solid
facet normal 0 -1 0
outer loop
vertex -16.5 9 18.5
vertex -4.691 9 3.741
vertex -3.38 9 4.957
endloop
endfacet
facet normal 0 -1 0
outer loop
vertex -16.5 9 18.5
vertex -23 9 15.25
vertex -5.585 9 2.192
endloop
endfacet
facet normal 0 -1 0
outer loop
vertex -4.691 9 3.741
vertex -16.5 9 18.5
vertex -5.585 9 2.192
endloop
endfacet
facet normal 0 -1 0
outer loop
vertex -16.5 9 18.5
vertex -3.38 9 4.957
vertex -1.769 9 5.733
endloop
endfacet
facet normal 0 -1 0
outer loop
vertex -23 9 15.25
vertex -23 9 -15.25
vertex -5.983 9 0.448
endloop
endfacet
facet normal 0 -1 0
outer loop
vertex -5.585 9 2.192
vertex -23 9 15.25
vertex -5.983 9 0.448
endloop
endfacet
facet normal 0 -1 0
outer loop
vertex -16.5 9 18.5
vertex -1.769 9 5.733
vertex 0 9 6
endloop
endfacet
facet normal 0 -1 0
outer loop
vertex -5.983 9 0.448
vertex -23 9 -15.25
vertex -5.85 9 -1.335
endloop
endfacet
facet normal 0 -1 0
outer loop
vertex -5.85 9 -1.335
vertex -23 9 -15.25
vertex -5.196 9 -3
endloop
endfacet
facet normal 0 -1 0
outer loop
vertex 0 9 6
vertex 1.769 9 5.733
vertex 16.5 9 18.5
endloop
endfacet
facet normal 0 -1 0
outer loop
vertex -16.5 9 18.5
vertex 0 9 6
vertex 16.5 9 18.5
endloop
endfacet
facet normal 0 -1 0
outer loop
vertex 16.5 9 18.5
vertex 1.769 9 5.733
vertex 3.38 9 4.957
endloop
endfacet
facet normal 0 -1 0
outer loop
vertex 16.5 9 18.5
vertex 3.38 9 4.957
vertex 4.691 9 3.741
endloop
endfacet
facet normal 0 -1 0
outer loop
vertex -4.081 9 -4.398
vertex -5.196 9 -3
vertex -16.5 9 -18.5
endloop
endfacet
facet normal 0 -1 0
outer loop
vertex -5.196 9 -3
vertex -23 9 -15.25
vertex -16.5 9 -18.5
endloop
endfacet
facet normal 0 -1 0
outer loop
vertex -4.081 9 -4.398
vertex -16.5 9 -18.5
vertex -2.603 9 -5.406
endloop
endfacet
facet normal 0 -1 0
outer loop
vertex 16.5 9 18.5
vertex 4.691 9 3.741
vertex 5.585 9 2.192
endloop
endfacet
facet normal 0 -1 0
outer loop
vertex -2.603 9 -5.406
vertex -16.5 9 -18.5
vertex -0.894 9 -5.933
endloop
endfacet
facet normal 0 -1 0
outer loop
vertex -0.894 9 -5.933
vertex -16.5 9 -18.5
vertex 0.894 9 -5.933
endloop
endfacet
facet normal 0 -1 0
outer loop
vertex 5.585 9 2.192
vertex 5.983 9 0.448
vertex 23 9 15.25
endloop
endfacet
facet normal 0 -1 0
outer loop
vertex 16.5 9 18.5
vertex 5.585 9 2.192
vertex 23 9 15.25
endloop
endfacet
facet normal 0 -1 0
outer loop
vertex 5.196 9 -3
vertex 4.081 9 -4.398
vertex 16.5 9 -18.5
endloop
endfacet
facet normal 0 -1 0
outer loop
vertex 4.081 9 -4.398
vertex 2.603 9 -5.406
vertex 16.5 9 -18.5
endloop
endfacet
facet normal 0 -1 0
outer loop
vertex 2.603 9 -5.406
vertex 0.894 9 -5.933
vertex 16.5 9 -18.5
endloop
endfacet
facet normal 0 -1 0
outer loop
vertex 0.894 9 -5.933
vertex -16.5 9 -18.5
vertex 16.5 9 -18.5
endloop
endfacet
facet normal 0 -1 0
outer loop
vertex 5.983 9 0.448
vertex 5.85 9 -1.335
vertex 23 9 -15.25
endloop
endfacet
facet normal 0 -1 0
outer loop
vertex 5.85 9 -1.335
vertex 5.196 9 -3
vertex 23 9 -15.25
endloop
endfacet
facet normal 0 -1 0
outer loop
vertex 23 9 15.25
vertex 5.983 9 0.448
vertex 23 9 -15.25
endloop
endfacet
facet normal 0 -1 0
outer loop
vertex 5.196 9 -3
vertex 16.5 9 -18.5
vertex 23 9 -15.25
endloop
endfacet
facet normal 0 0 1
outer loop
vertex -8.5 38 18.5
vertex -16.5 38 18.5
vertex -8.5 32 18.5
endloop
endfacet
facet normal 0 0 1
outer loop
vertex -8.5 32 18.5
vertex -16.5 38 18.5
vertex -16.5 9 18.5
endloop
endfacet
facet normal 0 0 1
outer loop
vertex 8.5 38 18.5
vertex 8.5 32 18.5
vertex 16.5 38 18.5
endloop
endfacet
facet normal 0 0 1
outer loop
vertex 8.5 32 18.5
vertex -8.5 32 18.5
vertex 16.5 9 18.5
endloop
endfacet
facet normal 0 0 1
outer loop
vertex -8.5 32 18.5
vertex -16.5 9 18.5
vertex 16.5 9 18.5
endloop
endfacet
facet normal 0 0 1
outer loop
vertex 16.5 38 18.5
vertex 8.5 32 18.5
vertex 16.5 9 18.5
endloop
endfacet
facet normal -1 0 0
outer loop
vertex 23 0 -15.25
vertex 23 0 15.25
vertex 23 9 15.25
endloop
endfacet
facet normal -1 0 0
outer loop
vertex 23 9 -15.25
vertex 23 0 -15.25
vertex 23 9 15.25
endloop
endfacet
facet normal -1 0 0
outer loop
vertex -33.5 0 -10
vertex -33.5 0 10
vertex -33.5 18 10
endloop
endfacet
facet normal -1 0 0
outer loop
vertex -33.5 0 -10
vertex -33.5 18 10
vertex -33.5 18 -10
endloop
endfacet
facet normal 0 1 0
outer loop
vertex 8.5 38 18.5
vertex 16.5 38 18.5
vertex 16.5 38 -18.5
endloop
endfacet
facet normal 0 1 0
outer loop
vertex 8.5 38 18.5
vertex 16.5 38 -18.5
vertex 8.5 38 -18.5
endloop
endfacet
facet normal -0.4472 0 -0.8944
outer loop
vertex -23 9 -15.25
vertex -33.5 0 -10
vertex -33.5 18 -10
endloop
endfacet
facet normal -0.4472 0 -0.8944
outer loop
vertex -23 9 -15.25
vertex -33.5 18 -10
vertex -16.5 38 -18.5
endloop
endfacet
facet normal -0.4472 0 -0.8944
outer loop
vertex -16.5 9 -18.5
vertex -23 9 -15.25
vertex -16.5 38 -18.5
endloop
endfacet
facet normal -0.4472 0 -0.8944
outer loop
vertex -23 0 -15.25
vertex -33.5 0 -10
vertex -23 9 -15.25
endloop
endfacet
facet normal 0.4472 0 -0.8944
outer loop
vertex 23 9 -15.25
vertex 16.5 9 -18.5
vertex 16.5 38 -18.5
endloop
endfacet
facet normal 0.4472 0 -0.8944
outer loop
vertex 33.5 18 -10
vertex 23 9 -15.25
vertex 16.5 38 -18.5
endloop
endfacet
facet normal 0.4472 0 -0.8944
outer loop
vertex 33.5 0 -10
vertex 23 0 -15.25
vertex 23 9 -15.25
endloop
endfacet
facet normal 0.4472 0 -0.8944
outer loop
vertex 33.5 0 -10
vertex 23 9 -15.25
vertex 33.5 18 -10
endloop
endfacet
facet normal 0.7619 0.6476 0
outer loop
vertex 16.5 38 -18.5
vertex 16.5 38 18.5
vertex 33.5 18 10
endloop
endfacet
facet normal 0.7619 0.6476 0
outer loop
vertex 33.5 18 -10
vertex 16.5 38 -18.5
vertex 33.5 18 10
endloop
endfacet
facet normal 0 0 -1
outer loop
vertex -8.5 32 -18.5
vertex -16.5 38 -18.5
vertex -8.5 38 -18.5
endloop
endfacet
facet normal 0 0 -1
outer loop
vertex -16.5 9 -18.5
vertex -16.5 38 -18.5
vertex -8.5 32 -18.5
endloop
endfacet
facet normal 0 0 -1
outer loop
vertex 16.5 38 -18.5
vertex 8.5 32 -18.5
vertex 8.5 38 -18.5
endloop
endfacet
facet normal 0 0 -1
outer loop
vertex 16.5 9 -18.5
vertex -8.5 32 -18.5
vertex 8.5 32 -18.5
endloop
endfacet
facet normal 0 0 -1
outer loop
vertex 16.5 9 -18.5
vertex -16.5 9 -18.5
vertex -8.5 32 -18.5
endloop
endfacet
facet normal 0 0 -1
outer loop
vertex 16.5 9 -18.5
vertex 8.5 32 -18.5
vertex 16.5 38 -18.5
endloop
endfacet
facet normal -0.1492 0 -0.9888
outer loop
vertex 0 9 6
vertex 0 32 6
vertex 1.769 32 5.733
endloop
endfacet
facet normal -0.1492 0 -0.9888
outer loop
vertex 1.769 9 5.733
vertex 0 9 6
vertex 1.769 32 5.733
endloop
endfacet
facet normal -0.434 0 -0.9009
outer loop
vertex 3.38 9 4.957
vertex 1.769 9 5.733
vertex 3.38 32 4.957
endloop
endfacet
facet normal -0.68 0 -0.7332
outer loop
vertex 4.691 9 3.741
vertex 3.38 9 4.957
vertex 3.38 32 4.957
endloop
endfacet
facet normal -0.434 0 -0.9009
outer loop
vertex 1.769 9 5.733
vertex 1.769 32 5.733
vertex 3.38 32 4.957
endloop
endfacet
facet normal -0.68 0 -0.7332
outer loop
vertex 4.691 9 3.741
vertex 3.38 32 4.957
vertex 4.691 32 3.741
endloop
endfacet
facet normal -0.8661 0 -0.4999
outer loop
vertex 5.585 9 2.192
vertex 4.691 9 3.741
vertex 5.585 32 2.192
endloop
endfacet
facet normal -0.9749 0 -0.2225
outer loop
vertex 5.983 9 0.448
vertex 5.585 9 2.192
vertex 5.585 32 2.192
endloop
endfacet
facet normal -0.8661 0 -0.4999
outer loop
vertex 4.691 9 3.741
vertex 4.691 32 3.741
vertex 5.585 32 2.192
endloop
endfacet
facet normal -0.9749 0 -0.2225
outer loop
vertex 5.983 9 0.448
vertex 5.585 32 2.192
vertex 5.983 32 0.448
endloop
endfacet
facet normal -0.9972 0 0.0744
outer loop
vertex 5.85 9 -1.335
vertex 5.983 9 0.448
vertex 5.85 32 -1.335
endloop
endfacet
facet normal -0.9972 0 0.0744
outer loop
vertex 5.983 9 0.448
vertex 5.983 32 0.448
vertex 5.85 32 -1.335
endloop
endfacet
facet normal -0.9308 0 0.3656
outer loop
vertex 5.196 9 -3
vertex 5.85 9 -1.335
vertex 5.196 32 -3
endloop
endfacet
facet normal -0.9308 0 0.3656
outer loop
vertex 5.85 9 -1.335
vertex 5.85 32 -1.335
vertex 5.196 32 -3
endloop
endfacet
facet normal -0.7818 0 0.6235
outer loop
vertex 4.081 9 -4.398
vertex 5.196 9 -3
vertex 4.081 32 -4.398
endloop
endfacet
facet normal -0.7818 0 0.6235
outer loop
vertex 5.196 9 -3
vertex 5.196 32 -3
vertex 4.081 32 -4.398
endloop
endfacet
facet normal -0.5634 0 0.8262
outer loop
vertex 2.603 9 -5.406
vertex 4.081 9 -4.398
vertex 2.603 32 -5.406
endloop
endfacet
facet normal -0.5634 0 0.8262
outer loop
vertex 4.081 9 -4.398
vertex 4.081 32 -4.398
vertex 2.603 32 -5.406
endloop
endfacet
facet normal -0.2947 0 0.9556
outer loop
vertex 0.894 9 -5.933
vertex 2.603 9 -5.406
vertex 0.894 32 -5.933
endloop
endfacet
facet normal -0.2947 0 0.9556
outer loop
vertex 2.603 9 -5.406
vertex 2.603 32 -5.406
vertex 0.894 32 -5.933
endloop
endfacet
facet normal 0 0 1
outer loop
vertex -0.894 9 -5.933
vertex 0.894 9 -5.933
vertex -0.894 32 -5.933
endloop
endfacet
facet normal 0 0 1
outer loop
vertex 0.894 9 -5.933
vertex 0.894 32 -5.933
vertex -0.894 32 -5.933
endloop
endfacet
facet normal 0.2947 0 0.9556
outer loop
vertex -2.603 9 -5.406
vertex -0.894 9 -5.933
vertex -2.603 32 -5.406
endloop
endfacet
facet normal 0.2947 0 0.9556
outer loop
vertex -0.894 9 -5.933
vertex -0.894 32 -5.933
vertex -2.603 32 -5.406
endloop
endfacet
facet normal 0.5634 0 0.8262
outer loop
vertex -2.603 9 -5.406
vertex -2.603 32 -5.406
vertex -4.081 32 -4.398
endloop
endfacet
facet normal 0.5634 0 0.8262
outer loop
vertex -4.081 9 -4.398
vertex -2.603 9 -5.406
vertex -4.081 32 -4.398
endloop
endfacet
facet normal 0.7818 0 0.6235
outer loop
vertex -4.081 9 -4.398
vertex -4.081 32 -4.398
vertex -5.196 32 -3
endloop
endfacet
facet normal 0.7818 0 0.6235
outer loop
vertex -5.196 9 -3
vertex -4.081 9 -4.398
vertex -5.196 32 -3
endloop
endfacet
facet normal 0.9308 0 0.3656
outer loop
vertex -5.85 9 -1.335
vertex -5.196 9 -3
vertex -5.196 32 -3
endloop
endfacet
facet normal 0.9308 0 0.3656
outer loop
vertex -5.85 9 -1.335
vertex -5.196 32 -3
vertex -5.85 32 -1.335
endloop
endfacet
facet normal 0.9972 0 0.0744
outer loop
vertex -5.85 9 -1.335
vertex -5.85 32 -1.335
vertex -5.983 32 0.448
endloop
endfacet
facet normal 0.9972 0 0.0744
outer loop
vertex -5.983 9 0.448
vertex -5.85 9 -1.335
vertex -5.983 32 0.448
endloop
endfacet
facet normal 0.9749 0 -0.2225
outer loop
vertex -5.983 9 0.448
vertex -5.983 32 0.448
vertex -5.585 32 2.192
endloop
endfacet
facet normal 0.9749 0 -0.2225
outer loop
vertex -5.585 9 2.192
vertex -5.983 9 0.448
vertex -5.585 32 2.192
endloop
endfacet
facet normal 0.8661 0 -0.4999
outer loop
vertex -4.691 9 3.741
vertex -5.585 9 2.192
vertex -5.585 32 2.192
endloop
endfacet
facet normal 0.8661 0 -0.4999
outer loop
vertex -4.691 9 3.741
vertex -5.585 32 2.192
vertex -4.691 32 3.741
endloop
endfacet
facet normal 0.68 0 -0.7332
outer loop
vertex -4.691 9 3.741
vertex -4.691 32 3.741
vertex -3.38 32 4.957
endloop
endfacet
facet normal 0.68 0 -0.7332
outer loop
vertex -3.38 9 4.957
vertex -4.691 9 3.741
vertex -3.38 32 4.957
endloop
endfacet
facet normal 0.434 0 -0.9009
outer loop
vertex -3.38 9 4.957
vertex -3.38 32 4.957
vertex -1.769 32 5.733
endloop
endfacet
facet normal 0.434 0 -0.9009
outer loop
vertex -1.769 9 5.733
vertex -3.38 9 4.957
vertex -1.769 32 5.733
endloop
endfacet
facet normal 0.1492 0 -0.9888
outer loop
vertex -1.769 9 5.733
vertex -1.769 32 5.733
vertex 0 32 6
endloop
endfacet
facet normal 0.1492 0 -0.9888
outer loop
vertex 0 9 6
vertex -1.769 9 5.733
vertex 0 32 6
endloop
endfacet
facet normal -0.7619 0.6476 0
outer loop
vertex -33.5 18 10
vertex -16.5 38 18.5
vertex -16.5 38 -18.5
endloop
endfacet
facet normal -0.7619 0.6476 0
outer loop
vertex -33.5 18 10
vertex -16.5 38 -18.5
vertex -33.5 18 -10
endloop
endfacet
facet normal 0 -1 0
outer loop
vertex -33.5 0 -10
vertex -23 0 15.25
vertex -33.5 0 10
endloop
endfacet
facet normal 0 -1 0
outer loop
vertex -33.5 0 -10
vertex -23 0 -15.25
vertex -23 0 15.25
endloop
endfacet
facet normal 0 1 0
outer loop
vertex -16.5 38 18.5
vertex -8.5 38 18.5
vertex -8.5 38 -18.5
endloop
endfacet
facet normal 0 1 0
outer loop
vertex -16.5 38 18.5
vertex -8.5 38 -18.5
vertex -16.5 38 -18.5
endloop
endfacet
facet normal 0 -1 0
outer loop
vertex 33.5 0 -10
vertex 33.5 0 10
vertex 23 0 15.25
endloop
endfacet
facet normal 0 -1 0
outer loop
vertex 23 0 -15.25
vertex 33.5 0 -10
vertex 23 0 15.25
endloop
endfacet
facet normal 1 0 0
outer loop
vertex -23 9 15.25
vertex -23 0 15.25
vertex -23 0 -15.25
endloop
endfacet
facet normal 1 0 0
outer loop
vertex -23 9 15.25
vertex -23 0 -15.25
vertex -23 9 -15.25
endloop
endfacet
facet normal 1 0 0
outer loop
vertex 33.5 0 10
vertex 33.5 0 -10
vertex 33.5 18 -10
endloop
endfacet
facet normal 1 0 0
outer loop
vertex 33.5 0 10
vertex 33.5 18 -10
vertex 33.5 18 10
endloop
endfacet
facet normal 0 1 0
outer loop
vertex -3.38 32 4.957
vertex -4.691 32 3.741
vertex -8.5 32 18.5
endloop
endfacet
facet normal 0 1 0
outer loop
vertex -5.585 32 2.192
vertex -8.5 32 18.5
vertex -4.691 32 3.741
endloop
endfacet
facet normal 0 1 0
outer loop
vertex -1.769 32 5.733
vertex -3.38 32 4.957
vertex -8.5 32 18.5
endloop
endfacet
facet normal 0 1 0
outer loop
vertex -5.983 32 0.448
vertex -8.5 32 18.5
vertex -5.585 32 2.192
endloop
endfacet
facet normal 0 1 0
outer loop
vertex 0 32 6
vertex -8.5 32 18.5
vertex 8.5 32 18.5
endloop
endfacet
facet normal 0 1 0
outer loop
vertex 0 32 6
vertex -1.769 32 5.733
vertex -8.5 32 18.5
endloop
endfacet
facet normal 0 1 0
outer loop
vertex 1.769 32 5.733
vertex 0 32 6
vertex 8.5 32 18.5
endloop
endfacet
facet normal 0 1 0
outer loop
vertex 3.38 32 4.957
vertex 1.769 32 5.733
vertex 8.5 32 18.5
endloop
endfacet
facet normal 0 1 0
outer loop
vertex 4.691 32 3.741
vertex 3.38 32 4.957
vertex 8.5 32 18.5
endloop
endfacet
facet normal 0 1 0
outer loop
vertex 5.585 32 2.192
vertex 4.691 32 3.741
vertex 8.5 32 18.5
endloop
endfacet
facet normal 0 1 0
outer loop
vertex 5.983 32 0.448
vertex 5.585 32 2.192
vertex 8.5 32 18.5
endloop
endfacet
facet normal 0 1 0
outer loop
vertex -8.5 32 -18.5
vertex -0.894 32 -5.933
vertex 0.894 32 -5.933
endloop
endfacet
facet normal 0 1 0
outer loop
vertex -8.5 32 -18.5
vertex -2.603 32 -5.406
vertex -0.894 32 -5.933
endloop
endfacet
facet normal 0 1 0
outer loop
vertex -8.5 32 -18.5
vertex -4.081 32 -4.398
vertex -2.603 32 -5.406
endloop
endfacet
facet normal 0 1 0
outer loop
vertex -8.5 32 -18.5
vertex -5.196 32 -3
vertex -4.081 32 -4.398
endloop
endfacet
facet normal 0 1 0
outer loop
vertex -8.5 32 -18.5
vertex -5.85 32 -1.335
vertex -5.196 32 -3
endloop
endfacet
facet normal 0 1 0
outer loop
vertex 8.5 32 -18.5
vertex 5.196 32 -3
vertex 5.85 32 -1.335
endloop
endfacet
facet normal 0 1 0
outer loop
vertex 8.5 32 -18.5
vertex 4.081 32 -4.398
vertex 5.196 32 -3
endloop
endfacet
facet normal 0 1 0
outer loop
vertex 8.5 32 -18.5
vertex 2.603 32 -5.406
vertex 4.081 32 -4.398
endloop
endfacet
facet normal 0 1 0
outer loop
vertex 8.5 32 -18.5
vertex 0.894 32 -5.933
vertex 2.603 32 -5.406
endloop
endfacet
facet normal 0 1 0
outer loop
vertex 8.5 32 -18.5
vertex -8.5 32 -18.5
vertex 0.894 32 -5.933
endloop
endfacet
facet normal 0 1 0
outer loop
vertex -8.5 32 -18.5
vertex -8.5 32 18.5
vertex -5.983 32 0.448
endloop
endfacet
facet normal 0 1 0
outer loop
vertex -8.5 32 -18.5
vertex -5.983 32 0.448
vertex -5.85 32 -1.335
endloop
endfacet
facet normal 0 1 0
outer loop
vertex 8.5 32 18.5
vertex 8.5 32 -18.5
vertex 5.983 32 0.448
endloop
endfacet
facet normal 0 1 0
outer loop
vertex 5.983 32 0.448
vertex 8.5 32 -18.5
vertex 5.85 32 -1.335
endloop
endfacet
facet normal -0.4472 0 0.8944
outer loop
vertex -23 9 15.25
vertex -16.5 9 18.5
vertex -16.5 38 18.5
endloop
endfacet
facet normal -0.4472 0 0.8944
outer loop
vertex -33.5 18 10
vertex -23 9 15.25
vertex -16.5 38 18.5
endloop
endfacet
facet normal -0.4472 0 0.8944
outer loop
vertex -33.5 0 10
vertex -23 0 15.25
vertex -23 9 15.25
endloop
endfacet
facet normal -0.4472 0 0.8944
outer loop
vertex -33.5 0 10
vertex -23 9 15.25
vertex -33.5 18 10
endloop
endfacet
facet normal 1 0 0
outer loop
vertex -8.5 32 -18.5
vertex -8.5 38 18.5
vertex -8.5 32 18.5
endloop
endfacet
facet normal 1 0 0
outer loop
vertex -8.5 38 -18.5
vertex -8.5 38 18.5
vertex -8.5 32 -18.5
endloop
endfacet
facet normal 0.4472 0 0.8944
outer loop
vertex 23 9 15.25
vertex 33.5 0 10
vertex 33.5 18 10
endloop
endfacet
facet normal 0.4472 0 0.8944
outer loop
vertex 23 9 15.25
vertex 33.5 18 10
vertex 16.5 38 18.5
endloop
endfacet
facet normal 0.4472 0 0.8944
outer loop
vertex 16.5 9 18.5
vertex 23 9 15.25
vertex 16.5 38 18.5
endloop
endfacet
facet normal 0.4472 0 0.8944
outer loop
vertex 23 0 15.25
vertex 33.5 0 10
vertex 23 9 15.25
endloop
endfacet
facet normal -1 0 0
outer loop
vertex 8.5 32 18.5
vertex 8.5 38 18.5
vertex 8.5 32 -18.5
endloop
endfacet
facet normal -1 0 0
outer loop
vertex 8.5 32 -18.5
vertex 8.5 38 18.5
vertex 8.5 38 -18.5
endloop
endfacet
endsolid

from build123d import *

# Parameters (mm, degrees)
SKETCH_1_W               = 33
SKETCH_1_H               = 37
EXTRUDE_1_DEPTH          = 38
CUT_EXTRUDE_1_DEPTH      = 54.930510845
CUT_EXTRUDE_2_DEPTH      = 54.930510845
CUT_EXTRUDE_2_DEPTH_BACK = 54.930510845
SKETCH_3_W               = 46
SKETCH_3_H               = 9
SKETCH_4_W               = 17
SKETCH_4_H               = 37
CUT_EXTRUDE_3_DEPTH      = 6
SKETCH_5_R               = 6
CUT_EXTRUDE_4_DEPTH      = 50.884867445


with BuildPart() as part:
    # 草图1 → 凸台-拉伸1 (new body)
    with BuildSketch(Plane(origin=(0, 0, 0), x_dir=(1, 0, 0), z_dir=(0, 1, 0))):
        Polygon((-33.5, -10), (-33.5, 10), (-16.5, 18.5), (-16.5, -18.5), align=None)
        Rectangle(SKETCH_1_W, SKETCH_1_H)
        Polygon((33.5, -10), (16.5, -18.5), (16.5, 18.5), (33.5, 10), align=None)
    extrude(amount=EXTRUDE_1_DEPTH)

    # 草图2 → 切除-拉伸1 (cut, symmetric)
    with BuildSketch(Plane.XY):
        Polygon((-80.545432509, 152.17109707), (16.5, 38), (33.5, 18), (130.545432509, -96.17109707), (358.887626649, 97.919767949), (147.79676163, 346.261962088), align=None)
    cut_extrude_1 = extrude(amount=CUT_EXTRUDE_1_DEPTH, both=True, mode=Mode.SUBTRACT)

    # 镜向1: 切除-拉伸1 across plane
    add(cut_extrude_1.mirror(Plane(origin=(0, 0, 0), x_dir=(0, 0, 1), z_dir=(1, 0, 0))), mode=Mode.SUBTRACT)

    # 草图3 → 切除-拉伸2 (cut, two sides: drawn at the far end of the back side and taken through both)
    with BuildSketch(Plane.XY.offset(-CUT_EXTRUDE_2_DEPTH_BACK)):
        with Locations((0, 4.5)):
            Rectangle(SKETCH_3_W, SKETCH_3_H)
    extrude(amount=CUT_EXTRUDE_2_DEPTH + CUT_EXTRUDE_2_DEPTH_BACK, mode=Mode.SUBTRACT)

    # 草图4 → 切除-拉伸3 (cut)
    with BuildSketch(Plane(origin=(0, 38, 0), x_dir=(1, 0, 0), z_dir=(0, 1, 0))):
        Rectangle(SKETCH_4_W, SKETCH_4_H)
    extrude(amount=-CUT_EXTRUDE_3_DEPTH, mode=Mode.SUBTRACT)

    # 草图5 → 切除-拉伸4 (cut, through all)
    with BuildSketch(Plane(origin=(0, 32, 0), x_dir=(1, 0, 0), z_dir=(0, 1, 0))):
        with Locations(Location((0, 0, 0), (0, 0, 270))):
            Circle(SKETCH_5_R)
    extrude(amount=-CUT_EXTRUDE_4_DEPTH, mode=Mode.SUBTRACT)


solid = part.part
